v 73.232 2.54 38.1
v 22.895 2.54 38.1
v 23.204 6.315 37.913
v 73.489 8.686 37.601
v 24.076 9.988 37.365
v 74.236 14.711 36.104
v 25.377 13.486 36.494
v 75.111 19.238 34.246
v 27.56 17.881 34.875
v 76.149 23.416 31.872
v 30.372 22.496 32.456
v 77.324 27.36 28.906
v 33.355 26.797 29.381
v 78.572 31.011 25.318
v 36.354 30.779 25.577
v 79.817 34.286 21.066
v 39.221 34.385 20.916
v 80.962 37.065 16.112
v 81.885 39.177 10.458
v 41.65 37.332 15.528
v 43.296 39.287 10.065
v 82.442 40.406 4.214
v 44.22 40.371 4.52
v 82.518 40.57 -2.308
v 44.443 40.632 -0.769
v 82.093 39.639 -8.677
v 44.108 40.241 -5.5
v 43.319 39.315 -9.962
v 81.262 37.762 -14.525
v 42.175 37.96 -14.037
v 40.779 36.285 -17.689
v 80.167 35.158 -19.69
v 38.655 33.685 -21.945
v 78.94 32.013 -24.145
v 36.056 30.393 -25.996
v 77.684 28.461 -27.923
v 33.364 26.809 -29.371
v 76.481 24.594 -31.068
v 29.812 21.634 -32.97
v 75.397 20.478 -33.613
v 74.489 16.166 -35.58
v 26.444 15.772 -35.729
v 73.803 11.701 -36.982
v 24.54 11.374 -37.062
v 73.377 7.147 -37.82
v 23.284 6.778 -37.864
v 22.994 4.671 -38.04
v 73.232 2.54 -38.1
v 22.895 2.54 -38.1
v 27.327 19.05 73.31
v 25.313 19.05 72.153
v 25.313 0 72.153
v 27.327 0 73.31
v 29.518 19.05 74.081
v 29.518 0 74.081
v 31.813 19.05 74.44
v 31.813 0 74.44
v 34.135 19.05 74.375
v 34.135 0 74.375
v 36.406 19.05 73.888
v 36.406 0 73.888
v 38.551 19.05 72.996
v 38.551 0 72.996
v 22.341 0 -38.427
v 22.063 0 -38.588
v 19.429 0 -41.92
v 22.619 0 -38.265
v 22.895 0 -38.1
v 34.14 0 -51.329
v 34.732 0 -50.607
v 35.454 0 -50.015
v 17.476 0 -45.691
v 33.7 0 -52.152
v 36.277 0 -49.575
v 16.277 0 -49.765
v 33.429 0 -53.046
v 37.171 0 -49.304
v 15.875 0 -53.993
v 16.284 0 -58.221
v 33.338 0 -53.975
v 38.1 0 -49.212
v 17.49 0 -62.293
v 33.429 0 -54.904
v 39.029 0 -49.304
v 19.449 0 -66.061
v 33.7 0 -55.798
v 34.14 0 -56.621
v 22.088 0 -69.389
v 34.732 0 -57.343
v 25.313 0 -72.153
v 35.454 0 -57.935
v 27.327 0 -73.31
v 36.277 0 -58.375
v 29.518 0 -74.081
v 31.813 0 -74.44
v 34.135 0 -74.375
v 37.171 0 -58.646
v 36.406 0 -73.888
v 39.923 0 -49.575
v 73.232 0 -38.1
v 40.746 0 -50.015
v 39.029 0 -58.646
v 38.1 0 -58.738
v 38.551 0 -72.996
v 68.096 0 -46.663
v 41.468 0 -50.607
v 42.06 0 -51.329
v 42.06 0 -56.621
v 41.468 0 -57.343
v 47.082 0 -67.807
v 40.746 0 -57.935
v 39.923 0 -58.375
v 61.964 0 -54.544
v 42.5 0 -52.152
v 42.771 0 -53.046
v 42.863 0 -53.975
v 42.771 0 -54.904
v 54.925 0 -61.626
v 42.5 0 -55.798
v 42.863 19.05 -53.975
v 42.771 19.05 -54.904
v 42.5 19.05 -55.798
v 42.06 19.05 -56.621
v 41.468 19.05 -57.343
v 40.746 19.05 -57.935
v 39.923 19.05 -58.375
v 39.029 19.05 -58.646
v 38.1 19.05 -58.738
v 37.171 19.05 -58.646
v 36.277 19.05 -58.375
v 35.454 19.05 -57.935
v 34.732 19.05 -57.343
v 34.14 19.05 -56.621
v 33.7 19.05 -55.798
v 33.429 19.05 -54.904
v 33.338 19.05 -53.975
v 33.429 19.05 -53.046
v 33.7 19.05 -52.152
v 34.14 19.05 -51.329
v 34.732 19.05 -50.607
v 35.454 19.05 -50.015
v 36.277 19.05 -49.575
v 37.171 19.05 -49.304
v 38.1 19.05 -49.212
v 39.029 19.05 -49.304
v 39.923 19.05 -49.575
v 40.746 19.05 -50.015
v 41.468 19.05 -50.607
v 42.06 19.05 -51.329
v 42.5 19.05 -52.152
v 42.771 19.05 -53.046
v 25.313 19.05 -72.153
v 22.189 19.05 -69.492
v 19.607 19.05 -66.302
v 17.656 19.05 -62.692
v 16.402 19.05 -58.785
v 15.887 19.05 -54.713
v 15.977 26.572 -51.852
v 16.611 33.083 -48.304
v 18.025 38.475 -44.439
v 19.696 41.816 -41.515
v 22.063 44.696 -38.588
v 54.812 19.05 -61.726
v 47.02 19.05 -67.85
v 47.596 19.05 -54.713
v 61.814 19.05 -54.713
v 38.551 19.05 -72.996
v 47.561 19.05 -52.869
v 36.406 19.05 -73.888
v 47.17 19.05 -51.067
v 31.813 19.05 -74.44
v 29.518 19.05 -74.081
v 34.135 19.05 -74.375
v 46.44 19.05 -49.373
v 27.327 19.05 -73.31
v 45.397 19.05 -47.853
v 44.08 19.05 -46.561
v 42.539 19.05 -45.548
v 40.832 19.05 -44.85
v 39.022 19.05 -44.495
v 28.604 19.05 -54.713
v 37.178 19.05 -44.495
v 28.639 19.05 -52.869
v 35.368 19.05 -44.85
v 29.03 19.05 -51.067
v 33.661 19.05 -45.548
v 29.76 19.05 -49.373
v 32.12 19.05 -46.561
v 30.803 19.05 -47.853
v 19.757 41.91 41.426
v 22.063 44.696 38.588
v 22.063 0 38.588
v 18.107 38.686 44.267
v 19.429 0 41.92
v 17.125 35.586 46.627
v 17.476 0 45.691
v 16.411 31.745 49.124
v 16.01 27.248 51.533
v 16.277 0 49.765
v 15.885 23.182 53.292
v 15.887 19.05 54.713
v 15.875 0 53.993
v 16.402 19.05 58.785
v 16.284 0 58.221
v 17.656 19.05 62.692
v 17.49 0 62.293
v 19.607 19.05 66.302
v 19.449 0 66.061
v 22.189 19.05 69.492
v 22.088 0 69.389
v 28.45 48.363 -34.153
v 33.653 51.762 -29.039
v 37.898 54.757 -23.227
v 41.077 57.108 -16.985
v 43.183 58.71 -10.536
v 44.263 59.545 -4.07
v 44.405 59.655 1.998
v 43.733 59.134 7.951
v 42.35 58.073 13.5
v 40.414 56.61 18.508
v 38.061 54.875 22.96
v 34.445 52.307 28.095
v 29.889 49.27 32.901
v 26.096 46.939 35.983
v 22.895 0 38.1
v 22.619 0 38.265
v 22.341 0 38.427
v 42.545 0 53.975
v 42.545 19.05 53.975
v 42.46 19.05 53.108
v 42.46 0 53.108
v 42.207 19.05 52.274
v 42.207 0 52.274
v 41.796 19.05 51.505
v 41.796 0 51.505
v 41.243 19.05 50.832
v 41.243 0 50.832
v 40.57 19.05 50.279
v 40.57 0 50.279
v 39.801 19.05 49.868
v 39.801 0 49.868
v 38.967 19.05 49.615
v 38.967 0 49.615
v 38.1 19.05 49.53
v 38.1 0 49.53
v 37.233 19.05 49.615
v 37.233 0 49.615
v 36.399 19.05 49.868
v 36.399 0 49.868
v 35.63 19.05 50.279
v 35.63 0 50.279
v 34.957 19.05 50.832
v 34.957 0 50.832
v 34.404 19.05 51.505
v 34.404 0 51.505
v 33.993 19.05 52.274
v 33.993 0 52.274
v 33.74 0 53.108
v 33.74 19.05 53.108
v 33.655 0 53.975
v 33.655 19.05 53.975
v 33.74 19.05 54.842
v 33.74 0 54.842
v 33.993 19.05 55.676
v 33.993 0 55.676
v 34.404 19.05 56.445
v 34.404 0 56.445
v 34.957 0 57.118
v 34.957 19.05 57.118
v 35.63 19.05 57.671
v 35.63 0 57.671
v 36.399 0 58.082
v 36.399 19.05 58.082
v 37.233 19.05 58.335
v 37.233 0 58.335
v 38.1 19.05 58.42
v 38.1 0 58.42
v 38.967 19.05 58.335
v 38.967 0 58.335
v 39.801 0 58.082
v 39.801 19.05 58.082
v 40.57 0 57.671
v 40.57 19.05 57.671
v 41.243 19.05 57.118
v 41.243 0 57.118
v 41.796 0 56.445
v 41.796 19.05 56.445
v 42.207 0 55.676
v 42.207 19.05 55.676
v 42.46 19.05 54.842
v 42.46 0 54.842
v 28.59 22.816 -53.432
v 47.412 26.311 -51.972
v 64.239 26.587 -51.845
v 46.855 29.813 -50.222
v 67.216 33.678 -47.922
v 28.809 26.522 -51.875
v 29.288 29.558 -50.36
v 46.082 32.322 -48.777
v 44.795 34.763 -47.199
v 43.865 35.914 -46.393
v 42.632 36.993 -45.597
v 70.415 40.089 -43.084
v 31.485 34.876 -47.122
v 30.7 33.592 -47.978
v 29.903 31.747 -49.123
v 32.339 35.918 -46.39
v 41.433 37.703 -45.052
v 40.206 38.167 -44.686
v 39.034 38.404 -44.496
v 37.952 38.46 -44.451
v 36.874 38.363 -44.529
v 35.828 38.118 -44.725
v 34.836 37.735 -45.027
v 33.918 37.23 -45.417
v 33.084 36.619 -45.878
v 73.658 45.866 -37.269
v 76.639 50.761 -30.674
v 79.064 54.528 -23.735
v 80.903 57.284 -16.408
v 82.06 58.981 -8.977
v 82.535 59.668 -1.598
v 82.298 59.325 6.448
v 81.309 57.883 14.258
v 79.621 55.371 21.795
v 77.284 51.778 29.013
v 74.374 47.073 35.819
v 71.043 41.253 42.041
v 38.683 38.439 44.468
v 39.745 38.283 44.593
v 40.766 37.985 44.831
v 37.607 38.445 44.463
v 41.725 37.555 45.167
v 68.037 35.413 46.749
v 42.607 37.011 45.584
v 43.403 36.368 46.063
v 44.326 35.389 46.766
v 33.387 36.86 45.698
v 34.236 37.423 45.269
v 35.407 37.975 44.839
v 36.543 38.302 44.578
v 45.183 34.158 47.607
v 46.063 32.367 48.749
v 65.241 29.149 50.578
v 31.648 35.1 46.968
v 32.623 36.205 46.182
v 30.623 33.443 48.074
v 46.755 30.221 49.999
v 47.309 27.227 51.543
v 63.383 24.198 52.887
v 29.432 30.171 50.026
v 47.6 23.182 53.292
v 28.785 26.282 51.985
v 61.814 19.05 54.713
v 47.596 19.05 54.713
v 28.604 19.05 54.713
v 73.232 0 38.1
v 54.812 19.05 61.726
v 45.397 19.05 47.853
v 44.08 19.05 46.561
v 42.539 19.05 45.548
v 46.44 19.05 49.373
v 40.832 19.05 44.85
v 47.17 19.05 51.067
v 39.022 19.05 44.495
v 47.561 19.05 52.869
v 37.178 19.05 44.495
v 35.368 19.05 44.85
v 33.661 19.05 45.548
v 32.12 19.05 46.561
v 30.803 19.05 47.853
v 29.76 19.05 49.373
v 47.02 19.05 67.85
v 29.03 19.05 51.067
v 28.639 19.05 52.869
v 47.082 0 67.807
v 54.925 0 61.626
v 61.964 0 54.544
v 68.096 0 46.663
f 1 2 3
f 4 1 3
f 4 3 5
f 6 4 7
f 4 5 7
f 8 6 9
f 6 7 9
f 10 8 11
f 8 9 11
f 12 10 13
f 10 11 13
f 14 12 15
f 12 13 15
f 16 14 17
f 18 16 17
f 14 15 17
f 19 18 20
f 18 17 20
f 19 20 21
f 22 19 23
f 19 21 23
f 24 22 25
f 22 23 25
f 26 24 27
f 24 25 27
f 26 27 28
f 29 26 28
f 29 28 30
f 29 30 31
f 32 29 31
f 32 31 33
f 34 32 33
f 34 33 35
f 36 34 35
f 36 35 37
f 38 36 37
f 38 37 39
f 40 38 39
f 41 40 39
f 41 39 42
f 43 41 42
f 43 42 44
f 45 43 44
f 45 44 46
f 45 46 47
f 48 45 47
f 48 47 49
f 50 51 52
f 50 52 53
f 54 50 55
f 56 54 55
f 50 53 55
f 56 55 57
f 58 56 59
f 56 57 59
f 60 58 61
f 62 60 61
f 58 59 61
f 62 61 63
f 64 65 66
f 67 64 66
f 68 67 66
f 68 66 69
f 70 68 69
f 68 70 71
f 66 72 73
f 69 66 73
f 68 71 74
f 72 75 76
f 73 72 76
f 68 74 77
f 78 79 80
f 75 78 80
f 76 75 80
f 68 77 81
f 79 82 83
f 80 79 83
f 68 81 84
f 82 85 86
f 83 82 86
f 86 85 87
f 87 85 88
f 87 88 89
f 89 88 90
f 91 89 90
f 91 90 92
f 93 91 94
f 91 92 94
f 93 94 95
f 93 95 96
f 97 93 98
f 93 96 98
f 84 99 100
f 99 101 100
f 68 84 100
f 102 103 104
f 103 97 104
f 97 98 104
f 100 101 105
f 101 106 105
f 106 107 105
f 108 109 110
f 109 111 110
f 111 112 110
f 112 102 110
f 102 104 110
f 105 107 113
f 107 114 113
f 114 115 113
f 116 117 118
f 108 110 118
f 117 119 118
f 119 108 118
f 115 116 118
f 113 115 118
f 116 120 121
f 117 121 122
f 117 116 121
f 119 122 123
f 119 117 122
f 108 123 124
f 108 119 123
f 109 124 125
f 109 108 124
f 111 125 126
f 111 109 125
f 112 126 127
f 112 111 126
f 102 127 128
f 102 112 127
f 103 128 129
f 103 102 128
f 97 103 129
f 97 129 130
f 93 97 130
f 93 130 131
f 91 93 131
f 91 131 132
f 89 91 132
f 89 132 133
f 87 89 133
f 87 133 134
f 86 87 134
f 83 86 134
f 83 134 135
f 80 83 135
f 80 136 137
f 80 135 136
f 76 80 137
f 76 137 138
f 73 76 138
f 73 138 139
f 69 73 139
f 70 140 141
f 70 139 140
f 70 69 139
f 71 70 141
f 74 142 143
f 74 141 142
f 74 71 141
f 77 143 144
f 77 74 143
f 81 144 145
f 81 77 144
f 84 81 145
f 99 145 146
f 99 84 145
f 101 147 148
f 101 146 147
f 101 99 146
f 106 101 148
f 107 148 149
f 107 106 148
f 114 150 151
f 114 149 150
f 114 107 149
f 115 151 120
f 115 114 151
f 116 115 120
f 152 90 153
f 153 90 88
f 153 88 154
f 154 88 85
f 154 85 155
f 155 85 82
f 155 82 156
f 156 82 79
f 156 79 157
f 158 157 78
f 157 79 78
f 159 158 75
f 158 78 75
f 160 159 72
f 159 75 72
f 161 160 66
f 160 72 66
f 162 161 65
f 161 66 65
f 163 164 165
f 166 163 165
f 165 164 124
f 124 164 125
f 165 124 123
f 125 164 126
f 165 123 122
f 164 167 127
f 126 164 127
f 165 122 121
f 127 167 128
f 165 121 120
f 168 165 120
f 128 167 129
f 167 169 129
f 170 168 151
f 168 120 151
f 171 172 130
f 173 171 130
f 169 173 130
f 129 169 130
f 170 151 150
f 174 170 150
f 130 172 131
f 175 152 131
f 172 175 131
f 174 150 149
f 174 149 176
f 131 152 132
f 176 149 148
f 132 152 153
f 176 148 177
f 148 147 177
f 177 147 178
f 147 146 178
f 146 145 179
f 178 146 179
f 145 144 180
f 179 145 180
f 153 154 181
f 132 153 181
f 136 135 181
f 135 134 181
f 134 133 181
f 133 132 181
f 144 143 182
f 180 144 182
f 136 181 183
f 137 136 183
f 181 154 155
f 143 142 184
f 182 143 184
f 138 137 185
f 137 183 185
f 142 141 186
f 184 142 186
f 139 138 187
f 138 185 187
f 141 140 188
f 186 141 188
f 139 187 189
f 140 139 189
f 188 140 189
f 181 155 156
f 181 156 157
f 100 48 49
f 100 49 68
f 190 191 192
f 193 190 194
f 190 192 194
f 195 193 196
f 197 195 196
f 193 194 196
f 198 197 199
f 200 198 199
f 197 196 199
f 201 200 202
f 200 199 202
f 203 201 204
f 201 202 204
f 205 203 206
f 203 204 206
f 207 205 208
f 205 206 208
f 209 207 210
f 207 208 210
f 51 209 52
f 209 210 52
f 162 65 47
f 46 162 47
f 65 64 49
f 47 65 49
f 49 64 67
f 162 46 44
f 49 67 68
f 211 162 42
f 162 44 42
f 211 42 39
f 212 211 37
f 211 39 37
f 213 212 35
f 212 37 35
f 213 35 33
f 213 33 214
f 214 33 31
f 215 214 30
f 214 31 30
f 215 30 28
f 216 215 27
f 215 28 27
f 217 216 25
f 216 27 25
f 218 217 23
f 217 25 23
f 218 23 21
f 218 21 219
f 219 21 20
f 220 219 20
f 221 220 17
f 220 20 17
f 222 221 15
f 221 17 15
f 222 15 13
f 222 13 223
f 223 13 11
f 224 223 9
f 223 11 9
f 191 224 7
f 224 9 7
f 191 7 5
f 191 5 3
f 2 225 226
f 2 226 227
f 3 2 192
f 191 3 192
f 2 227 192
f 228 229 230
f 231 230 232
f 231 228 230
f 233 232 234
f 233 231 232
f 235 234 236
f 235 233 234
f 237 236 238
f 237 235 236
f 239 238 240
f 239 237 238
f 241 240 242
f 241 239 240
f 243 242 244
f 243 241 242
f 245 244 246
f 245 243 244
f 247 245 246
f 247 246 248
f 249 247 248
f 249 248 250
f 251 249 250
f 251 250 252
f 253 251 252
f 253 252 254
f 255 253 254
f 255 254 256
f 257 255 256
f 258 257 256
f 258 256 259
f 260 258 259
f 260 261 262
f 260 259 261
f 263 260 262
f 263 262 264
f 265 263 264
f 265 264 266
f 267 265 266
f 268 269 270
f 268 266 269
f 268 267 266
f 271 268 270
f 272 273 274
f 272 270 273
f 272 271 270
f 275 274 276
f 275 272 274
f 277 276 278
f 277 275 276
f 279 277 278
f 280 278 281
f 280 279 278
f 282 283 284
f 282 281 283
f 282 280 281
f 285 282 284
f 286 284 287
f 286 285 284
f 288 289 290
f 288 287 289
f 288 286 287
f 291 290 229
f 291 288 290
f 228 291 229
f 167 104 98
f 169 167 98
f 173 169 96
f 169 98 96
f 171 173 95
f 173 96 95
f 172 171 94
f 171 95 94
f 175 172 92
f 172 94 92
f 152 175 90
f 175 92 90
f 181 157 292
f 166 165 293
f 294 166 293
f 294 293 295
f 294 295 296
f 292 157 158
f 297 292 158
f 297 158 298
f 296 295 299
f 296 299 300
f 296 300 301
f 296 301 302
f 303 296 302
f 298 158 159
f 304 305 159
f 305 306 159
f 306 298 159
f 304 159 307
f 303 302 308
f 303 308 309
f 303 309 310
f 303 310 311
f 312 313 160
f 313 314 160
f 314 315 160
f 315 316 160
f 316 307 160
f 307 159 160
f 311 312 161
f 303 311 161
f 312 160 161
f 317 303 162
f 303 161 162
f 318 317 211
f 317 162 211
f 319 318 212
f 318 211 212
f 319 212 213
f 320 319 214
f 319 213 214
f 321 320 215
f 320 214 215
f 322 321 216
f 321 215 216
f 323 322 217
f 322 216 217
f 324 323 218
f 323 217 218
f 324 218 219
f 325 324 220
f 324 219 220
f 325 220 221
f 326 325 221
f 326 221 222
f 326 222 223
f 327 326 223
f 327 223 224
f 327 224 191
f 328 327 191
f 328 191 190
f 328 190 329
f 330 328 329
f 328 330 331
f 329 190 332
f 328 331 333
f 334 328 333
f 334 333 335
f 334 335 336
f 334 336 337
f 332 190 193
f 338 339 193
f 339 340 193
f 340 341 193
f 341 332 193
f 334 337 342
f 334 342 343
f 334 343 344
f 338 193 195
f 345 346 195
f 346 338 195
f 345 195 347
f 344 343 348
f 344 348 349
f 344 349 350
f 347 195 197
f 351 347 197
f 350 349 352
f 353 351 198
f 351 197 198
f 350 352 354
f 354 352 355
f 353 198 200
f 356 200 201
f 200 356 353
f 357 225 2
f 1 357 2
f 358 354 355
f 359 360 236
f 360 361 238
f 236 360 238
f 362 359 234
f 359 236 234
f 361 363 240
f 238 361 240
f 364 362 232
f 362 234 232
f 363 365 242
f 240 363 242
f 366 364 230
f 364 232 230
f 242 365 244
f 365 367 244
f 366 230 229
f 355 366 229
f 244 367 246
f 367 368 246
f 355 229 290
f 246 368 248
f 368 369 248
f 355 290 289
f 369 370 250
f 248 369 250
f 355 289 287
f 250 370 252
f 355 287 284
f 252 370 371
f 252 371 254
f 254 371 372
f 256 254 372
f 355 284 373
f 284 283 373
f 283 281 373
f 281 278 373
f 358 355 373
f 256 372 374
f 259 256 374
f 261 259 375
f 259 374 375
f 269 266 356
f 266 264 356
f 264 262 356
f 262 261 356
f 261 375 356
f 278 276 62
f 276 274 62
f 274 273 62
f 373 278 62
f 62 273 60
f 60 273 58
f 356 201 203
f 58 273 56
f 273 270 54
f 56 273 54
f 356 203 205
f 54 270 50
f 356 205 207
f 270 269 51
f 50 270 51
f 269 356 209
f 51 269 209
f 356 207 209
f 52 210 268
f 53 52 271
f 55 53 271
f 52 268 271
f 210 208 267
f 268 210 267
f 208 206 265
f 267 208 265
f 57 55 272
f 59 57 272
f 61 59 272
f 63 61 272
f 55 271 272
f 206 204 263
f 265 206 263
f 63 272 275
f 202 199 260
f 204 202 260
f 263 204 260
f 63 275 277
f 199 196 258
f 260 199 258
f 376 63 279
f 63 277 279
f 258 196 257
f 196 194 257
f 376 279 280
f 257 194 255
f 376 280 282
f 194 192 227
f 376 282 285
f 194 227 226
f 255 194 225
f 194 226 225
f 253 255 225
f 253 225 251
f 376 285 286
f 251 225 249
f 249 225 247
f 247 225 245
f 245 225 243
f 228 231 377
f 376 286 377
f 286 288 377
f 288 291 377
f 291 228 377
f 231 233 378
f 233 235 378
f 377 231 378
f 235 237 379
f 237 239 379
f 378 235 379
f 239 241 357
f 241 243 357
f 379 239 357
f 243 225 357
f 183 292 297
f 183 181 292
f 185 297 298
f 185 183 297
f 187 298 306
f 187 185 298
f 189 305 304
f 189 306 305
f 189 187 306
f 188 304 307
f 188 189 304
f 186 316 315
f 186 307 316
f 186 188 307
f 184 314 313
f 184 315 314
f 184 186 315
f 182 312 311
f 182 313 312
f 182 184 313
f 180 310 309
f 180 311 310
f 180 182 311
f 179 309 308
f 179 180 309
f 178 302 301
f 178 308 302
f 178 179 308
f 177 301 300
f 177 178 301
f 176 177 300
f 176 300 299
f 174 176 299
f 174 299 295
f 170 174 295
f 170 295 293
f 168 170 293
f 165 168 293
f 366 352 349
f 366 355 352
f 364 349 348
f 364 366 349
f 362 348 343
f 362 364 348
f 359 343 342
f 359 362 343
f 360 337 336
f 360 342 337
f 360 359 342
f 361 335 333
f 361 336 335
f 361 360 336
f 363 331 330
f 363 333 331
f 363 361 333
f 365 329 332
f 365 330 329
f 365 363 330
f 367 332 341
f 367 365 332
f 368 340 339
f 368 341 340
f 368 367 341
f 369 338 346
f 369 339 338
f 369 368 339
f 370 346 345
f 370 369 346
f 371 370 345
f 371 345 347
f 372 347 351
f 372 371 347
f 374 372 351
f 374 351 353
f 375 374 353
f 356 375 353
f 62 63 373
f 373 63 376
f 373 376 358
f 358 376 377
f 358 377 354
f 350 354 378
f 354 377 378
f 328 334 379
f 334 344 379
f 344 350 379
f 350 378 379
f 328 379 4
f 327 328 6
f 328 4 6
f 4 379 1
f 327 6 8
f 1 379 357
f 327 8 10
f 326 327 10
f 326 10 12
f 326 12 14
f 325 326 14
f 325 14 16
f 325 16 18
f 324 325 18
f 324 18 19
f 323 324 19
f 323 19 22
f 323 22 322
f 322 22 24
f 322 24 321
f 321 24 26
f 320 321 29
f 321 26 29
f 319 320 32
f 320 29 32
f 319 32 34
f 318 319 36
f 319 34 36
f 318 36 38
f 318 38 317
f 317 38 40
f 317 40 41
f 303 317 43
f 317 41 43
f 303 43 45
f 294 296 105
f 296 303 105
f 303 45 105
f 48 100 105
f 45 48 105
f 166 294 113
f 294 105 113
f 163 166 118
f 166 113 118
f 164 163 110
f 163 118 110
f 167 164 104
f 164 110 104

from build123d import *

# Parameters (mm, degrees)
SKETCH1_R               = 4.7625
SKETCH1_R_2             = 4.445
BOSS_EXTRUDE1_DEPTH     = 76.2
CUT_EXTRUDE6_DEPTH      = 61.487180317
CUT_EXTRUDE7_DEPTH      = 7.187819683
CUT_EXTRUDE7_DEPTH_BACK = 61.487180417
SKETCH10_R              = 9.525
CUT_EXTRUDE8_DEPTH      = 41.6400001


with BuildPart() as part:
    # Sketch1 → Boss-Extrude1 (new body)
    with BuildSketch(Plane(origin=(0, 0, 0), x_dir=(1, 0, 0), z_dir=(0, 1, 0))):
        with BuildLine():
            ThreePointArc((38.550556967, -72.995596152), (82.55, 0), (38.550556967, 72.995596152))
            ThreePointArc((38.550556967, 72.995596152), (31.812827991, 74.439846796), (25.312638114, 72.152843684))
            ThreePointArc((25.312638114, 72.152843684), (15.978447625, 56.116855626), (22.062819683, 38.588009636))
            ThreePointArc((22.062819683, 38.588009636), (44.45, 0), (22.062819683, -38.588009636))
            ThreePointArc((22.062819683, -38.588009636), (15.978447625, -56.116855626), (25.312638114, -72.152843684))
            ThreePointArc((25.312638114, -72.152843684), (31.812827991, -74.439846796), (38.550556967, -72.995596152))
        make_face()
        with Locations((38.1, 53.975)):
            Circle(SKETCH1_R, mode=Mode.SUBTRACT)
        with Locations((38.1, -53.975)):
            Circle(SKETCH1_R_2, mode=Mode.SUBTRACT)
    extrude(amount=BOSS_EXTRUDE1_DEPTH)

    # Sketch7 → Cut-Extrude6 (cut, through all)
    with BuildSketch(Plane.ZY.offset(-22.062819683)):
        with BuildLine():
            Line((-38.1, 2.54), (-38.1, 0))
            Line((-38.1, 0), (38.1, 0))
            Line((38.1, 0), (38.1, 2.54))
            ThreePointArc((38.1, 2.54), (0, 40.64), (-38.1, 2.54))
        make_face()
    extrude(amount=-CUT_EXTRUDE6_DEPTH, mode=Mode.SUBTRACT)

    # Sketch9 → Cut-Extrude7 (cut, two sides)
    with BuildSketch(Plane.ZY.offset(-22.062819683)) as cut_extrude7_sk:
        with BuildLine():
            Line((-74.465504436, 76.2), (-74.465504436, 19.05))
            Line((-74.465504436, 19.05), (-54.71327444, 19.05))
            ThreePointArc((-54.71327444, 19.05), (0, 59.69), (54.71327444, 19.05))
            Line((54.71327444, 19.05), (74.465504436, 19.05))
            Line((74.465504436, 19.05), (74.465504436, 76.2))
            Line((74.465504436, 76.2), (-74.465504436, 76.2))
        make_face()
    extrude(amount=CUT_EXTRUDE7_DEPTH, mode=Mode.SUBTRACT)
    extrude(cut_extrude7_sk.sketch, amount=-CUT_EXTRUDE7_DEPTH_BACK, mode=Mode.SUBTRACT)

    # Sketch10 → Cut-Extrude8 (cut, through all)
    with BuildSketch(Plane(origin=(0, 19.05, 0), x_dir=(1, 0, 0), z_dir=(0, 1, 0))):
        with Locations((38.1, 53.975)):
            Circle(SKETCH10_R)
        with Locations((38.1, -53.975)):
            Circle(SKETCH10_R)
    extrude(amount=CUT_EXTRUDE8_DEPTH, mode=Mode.SUBTRACT)


solid = part.part
